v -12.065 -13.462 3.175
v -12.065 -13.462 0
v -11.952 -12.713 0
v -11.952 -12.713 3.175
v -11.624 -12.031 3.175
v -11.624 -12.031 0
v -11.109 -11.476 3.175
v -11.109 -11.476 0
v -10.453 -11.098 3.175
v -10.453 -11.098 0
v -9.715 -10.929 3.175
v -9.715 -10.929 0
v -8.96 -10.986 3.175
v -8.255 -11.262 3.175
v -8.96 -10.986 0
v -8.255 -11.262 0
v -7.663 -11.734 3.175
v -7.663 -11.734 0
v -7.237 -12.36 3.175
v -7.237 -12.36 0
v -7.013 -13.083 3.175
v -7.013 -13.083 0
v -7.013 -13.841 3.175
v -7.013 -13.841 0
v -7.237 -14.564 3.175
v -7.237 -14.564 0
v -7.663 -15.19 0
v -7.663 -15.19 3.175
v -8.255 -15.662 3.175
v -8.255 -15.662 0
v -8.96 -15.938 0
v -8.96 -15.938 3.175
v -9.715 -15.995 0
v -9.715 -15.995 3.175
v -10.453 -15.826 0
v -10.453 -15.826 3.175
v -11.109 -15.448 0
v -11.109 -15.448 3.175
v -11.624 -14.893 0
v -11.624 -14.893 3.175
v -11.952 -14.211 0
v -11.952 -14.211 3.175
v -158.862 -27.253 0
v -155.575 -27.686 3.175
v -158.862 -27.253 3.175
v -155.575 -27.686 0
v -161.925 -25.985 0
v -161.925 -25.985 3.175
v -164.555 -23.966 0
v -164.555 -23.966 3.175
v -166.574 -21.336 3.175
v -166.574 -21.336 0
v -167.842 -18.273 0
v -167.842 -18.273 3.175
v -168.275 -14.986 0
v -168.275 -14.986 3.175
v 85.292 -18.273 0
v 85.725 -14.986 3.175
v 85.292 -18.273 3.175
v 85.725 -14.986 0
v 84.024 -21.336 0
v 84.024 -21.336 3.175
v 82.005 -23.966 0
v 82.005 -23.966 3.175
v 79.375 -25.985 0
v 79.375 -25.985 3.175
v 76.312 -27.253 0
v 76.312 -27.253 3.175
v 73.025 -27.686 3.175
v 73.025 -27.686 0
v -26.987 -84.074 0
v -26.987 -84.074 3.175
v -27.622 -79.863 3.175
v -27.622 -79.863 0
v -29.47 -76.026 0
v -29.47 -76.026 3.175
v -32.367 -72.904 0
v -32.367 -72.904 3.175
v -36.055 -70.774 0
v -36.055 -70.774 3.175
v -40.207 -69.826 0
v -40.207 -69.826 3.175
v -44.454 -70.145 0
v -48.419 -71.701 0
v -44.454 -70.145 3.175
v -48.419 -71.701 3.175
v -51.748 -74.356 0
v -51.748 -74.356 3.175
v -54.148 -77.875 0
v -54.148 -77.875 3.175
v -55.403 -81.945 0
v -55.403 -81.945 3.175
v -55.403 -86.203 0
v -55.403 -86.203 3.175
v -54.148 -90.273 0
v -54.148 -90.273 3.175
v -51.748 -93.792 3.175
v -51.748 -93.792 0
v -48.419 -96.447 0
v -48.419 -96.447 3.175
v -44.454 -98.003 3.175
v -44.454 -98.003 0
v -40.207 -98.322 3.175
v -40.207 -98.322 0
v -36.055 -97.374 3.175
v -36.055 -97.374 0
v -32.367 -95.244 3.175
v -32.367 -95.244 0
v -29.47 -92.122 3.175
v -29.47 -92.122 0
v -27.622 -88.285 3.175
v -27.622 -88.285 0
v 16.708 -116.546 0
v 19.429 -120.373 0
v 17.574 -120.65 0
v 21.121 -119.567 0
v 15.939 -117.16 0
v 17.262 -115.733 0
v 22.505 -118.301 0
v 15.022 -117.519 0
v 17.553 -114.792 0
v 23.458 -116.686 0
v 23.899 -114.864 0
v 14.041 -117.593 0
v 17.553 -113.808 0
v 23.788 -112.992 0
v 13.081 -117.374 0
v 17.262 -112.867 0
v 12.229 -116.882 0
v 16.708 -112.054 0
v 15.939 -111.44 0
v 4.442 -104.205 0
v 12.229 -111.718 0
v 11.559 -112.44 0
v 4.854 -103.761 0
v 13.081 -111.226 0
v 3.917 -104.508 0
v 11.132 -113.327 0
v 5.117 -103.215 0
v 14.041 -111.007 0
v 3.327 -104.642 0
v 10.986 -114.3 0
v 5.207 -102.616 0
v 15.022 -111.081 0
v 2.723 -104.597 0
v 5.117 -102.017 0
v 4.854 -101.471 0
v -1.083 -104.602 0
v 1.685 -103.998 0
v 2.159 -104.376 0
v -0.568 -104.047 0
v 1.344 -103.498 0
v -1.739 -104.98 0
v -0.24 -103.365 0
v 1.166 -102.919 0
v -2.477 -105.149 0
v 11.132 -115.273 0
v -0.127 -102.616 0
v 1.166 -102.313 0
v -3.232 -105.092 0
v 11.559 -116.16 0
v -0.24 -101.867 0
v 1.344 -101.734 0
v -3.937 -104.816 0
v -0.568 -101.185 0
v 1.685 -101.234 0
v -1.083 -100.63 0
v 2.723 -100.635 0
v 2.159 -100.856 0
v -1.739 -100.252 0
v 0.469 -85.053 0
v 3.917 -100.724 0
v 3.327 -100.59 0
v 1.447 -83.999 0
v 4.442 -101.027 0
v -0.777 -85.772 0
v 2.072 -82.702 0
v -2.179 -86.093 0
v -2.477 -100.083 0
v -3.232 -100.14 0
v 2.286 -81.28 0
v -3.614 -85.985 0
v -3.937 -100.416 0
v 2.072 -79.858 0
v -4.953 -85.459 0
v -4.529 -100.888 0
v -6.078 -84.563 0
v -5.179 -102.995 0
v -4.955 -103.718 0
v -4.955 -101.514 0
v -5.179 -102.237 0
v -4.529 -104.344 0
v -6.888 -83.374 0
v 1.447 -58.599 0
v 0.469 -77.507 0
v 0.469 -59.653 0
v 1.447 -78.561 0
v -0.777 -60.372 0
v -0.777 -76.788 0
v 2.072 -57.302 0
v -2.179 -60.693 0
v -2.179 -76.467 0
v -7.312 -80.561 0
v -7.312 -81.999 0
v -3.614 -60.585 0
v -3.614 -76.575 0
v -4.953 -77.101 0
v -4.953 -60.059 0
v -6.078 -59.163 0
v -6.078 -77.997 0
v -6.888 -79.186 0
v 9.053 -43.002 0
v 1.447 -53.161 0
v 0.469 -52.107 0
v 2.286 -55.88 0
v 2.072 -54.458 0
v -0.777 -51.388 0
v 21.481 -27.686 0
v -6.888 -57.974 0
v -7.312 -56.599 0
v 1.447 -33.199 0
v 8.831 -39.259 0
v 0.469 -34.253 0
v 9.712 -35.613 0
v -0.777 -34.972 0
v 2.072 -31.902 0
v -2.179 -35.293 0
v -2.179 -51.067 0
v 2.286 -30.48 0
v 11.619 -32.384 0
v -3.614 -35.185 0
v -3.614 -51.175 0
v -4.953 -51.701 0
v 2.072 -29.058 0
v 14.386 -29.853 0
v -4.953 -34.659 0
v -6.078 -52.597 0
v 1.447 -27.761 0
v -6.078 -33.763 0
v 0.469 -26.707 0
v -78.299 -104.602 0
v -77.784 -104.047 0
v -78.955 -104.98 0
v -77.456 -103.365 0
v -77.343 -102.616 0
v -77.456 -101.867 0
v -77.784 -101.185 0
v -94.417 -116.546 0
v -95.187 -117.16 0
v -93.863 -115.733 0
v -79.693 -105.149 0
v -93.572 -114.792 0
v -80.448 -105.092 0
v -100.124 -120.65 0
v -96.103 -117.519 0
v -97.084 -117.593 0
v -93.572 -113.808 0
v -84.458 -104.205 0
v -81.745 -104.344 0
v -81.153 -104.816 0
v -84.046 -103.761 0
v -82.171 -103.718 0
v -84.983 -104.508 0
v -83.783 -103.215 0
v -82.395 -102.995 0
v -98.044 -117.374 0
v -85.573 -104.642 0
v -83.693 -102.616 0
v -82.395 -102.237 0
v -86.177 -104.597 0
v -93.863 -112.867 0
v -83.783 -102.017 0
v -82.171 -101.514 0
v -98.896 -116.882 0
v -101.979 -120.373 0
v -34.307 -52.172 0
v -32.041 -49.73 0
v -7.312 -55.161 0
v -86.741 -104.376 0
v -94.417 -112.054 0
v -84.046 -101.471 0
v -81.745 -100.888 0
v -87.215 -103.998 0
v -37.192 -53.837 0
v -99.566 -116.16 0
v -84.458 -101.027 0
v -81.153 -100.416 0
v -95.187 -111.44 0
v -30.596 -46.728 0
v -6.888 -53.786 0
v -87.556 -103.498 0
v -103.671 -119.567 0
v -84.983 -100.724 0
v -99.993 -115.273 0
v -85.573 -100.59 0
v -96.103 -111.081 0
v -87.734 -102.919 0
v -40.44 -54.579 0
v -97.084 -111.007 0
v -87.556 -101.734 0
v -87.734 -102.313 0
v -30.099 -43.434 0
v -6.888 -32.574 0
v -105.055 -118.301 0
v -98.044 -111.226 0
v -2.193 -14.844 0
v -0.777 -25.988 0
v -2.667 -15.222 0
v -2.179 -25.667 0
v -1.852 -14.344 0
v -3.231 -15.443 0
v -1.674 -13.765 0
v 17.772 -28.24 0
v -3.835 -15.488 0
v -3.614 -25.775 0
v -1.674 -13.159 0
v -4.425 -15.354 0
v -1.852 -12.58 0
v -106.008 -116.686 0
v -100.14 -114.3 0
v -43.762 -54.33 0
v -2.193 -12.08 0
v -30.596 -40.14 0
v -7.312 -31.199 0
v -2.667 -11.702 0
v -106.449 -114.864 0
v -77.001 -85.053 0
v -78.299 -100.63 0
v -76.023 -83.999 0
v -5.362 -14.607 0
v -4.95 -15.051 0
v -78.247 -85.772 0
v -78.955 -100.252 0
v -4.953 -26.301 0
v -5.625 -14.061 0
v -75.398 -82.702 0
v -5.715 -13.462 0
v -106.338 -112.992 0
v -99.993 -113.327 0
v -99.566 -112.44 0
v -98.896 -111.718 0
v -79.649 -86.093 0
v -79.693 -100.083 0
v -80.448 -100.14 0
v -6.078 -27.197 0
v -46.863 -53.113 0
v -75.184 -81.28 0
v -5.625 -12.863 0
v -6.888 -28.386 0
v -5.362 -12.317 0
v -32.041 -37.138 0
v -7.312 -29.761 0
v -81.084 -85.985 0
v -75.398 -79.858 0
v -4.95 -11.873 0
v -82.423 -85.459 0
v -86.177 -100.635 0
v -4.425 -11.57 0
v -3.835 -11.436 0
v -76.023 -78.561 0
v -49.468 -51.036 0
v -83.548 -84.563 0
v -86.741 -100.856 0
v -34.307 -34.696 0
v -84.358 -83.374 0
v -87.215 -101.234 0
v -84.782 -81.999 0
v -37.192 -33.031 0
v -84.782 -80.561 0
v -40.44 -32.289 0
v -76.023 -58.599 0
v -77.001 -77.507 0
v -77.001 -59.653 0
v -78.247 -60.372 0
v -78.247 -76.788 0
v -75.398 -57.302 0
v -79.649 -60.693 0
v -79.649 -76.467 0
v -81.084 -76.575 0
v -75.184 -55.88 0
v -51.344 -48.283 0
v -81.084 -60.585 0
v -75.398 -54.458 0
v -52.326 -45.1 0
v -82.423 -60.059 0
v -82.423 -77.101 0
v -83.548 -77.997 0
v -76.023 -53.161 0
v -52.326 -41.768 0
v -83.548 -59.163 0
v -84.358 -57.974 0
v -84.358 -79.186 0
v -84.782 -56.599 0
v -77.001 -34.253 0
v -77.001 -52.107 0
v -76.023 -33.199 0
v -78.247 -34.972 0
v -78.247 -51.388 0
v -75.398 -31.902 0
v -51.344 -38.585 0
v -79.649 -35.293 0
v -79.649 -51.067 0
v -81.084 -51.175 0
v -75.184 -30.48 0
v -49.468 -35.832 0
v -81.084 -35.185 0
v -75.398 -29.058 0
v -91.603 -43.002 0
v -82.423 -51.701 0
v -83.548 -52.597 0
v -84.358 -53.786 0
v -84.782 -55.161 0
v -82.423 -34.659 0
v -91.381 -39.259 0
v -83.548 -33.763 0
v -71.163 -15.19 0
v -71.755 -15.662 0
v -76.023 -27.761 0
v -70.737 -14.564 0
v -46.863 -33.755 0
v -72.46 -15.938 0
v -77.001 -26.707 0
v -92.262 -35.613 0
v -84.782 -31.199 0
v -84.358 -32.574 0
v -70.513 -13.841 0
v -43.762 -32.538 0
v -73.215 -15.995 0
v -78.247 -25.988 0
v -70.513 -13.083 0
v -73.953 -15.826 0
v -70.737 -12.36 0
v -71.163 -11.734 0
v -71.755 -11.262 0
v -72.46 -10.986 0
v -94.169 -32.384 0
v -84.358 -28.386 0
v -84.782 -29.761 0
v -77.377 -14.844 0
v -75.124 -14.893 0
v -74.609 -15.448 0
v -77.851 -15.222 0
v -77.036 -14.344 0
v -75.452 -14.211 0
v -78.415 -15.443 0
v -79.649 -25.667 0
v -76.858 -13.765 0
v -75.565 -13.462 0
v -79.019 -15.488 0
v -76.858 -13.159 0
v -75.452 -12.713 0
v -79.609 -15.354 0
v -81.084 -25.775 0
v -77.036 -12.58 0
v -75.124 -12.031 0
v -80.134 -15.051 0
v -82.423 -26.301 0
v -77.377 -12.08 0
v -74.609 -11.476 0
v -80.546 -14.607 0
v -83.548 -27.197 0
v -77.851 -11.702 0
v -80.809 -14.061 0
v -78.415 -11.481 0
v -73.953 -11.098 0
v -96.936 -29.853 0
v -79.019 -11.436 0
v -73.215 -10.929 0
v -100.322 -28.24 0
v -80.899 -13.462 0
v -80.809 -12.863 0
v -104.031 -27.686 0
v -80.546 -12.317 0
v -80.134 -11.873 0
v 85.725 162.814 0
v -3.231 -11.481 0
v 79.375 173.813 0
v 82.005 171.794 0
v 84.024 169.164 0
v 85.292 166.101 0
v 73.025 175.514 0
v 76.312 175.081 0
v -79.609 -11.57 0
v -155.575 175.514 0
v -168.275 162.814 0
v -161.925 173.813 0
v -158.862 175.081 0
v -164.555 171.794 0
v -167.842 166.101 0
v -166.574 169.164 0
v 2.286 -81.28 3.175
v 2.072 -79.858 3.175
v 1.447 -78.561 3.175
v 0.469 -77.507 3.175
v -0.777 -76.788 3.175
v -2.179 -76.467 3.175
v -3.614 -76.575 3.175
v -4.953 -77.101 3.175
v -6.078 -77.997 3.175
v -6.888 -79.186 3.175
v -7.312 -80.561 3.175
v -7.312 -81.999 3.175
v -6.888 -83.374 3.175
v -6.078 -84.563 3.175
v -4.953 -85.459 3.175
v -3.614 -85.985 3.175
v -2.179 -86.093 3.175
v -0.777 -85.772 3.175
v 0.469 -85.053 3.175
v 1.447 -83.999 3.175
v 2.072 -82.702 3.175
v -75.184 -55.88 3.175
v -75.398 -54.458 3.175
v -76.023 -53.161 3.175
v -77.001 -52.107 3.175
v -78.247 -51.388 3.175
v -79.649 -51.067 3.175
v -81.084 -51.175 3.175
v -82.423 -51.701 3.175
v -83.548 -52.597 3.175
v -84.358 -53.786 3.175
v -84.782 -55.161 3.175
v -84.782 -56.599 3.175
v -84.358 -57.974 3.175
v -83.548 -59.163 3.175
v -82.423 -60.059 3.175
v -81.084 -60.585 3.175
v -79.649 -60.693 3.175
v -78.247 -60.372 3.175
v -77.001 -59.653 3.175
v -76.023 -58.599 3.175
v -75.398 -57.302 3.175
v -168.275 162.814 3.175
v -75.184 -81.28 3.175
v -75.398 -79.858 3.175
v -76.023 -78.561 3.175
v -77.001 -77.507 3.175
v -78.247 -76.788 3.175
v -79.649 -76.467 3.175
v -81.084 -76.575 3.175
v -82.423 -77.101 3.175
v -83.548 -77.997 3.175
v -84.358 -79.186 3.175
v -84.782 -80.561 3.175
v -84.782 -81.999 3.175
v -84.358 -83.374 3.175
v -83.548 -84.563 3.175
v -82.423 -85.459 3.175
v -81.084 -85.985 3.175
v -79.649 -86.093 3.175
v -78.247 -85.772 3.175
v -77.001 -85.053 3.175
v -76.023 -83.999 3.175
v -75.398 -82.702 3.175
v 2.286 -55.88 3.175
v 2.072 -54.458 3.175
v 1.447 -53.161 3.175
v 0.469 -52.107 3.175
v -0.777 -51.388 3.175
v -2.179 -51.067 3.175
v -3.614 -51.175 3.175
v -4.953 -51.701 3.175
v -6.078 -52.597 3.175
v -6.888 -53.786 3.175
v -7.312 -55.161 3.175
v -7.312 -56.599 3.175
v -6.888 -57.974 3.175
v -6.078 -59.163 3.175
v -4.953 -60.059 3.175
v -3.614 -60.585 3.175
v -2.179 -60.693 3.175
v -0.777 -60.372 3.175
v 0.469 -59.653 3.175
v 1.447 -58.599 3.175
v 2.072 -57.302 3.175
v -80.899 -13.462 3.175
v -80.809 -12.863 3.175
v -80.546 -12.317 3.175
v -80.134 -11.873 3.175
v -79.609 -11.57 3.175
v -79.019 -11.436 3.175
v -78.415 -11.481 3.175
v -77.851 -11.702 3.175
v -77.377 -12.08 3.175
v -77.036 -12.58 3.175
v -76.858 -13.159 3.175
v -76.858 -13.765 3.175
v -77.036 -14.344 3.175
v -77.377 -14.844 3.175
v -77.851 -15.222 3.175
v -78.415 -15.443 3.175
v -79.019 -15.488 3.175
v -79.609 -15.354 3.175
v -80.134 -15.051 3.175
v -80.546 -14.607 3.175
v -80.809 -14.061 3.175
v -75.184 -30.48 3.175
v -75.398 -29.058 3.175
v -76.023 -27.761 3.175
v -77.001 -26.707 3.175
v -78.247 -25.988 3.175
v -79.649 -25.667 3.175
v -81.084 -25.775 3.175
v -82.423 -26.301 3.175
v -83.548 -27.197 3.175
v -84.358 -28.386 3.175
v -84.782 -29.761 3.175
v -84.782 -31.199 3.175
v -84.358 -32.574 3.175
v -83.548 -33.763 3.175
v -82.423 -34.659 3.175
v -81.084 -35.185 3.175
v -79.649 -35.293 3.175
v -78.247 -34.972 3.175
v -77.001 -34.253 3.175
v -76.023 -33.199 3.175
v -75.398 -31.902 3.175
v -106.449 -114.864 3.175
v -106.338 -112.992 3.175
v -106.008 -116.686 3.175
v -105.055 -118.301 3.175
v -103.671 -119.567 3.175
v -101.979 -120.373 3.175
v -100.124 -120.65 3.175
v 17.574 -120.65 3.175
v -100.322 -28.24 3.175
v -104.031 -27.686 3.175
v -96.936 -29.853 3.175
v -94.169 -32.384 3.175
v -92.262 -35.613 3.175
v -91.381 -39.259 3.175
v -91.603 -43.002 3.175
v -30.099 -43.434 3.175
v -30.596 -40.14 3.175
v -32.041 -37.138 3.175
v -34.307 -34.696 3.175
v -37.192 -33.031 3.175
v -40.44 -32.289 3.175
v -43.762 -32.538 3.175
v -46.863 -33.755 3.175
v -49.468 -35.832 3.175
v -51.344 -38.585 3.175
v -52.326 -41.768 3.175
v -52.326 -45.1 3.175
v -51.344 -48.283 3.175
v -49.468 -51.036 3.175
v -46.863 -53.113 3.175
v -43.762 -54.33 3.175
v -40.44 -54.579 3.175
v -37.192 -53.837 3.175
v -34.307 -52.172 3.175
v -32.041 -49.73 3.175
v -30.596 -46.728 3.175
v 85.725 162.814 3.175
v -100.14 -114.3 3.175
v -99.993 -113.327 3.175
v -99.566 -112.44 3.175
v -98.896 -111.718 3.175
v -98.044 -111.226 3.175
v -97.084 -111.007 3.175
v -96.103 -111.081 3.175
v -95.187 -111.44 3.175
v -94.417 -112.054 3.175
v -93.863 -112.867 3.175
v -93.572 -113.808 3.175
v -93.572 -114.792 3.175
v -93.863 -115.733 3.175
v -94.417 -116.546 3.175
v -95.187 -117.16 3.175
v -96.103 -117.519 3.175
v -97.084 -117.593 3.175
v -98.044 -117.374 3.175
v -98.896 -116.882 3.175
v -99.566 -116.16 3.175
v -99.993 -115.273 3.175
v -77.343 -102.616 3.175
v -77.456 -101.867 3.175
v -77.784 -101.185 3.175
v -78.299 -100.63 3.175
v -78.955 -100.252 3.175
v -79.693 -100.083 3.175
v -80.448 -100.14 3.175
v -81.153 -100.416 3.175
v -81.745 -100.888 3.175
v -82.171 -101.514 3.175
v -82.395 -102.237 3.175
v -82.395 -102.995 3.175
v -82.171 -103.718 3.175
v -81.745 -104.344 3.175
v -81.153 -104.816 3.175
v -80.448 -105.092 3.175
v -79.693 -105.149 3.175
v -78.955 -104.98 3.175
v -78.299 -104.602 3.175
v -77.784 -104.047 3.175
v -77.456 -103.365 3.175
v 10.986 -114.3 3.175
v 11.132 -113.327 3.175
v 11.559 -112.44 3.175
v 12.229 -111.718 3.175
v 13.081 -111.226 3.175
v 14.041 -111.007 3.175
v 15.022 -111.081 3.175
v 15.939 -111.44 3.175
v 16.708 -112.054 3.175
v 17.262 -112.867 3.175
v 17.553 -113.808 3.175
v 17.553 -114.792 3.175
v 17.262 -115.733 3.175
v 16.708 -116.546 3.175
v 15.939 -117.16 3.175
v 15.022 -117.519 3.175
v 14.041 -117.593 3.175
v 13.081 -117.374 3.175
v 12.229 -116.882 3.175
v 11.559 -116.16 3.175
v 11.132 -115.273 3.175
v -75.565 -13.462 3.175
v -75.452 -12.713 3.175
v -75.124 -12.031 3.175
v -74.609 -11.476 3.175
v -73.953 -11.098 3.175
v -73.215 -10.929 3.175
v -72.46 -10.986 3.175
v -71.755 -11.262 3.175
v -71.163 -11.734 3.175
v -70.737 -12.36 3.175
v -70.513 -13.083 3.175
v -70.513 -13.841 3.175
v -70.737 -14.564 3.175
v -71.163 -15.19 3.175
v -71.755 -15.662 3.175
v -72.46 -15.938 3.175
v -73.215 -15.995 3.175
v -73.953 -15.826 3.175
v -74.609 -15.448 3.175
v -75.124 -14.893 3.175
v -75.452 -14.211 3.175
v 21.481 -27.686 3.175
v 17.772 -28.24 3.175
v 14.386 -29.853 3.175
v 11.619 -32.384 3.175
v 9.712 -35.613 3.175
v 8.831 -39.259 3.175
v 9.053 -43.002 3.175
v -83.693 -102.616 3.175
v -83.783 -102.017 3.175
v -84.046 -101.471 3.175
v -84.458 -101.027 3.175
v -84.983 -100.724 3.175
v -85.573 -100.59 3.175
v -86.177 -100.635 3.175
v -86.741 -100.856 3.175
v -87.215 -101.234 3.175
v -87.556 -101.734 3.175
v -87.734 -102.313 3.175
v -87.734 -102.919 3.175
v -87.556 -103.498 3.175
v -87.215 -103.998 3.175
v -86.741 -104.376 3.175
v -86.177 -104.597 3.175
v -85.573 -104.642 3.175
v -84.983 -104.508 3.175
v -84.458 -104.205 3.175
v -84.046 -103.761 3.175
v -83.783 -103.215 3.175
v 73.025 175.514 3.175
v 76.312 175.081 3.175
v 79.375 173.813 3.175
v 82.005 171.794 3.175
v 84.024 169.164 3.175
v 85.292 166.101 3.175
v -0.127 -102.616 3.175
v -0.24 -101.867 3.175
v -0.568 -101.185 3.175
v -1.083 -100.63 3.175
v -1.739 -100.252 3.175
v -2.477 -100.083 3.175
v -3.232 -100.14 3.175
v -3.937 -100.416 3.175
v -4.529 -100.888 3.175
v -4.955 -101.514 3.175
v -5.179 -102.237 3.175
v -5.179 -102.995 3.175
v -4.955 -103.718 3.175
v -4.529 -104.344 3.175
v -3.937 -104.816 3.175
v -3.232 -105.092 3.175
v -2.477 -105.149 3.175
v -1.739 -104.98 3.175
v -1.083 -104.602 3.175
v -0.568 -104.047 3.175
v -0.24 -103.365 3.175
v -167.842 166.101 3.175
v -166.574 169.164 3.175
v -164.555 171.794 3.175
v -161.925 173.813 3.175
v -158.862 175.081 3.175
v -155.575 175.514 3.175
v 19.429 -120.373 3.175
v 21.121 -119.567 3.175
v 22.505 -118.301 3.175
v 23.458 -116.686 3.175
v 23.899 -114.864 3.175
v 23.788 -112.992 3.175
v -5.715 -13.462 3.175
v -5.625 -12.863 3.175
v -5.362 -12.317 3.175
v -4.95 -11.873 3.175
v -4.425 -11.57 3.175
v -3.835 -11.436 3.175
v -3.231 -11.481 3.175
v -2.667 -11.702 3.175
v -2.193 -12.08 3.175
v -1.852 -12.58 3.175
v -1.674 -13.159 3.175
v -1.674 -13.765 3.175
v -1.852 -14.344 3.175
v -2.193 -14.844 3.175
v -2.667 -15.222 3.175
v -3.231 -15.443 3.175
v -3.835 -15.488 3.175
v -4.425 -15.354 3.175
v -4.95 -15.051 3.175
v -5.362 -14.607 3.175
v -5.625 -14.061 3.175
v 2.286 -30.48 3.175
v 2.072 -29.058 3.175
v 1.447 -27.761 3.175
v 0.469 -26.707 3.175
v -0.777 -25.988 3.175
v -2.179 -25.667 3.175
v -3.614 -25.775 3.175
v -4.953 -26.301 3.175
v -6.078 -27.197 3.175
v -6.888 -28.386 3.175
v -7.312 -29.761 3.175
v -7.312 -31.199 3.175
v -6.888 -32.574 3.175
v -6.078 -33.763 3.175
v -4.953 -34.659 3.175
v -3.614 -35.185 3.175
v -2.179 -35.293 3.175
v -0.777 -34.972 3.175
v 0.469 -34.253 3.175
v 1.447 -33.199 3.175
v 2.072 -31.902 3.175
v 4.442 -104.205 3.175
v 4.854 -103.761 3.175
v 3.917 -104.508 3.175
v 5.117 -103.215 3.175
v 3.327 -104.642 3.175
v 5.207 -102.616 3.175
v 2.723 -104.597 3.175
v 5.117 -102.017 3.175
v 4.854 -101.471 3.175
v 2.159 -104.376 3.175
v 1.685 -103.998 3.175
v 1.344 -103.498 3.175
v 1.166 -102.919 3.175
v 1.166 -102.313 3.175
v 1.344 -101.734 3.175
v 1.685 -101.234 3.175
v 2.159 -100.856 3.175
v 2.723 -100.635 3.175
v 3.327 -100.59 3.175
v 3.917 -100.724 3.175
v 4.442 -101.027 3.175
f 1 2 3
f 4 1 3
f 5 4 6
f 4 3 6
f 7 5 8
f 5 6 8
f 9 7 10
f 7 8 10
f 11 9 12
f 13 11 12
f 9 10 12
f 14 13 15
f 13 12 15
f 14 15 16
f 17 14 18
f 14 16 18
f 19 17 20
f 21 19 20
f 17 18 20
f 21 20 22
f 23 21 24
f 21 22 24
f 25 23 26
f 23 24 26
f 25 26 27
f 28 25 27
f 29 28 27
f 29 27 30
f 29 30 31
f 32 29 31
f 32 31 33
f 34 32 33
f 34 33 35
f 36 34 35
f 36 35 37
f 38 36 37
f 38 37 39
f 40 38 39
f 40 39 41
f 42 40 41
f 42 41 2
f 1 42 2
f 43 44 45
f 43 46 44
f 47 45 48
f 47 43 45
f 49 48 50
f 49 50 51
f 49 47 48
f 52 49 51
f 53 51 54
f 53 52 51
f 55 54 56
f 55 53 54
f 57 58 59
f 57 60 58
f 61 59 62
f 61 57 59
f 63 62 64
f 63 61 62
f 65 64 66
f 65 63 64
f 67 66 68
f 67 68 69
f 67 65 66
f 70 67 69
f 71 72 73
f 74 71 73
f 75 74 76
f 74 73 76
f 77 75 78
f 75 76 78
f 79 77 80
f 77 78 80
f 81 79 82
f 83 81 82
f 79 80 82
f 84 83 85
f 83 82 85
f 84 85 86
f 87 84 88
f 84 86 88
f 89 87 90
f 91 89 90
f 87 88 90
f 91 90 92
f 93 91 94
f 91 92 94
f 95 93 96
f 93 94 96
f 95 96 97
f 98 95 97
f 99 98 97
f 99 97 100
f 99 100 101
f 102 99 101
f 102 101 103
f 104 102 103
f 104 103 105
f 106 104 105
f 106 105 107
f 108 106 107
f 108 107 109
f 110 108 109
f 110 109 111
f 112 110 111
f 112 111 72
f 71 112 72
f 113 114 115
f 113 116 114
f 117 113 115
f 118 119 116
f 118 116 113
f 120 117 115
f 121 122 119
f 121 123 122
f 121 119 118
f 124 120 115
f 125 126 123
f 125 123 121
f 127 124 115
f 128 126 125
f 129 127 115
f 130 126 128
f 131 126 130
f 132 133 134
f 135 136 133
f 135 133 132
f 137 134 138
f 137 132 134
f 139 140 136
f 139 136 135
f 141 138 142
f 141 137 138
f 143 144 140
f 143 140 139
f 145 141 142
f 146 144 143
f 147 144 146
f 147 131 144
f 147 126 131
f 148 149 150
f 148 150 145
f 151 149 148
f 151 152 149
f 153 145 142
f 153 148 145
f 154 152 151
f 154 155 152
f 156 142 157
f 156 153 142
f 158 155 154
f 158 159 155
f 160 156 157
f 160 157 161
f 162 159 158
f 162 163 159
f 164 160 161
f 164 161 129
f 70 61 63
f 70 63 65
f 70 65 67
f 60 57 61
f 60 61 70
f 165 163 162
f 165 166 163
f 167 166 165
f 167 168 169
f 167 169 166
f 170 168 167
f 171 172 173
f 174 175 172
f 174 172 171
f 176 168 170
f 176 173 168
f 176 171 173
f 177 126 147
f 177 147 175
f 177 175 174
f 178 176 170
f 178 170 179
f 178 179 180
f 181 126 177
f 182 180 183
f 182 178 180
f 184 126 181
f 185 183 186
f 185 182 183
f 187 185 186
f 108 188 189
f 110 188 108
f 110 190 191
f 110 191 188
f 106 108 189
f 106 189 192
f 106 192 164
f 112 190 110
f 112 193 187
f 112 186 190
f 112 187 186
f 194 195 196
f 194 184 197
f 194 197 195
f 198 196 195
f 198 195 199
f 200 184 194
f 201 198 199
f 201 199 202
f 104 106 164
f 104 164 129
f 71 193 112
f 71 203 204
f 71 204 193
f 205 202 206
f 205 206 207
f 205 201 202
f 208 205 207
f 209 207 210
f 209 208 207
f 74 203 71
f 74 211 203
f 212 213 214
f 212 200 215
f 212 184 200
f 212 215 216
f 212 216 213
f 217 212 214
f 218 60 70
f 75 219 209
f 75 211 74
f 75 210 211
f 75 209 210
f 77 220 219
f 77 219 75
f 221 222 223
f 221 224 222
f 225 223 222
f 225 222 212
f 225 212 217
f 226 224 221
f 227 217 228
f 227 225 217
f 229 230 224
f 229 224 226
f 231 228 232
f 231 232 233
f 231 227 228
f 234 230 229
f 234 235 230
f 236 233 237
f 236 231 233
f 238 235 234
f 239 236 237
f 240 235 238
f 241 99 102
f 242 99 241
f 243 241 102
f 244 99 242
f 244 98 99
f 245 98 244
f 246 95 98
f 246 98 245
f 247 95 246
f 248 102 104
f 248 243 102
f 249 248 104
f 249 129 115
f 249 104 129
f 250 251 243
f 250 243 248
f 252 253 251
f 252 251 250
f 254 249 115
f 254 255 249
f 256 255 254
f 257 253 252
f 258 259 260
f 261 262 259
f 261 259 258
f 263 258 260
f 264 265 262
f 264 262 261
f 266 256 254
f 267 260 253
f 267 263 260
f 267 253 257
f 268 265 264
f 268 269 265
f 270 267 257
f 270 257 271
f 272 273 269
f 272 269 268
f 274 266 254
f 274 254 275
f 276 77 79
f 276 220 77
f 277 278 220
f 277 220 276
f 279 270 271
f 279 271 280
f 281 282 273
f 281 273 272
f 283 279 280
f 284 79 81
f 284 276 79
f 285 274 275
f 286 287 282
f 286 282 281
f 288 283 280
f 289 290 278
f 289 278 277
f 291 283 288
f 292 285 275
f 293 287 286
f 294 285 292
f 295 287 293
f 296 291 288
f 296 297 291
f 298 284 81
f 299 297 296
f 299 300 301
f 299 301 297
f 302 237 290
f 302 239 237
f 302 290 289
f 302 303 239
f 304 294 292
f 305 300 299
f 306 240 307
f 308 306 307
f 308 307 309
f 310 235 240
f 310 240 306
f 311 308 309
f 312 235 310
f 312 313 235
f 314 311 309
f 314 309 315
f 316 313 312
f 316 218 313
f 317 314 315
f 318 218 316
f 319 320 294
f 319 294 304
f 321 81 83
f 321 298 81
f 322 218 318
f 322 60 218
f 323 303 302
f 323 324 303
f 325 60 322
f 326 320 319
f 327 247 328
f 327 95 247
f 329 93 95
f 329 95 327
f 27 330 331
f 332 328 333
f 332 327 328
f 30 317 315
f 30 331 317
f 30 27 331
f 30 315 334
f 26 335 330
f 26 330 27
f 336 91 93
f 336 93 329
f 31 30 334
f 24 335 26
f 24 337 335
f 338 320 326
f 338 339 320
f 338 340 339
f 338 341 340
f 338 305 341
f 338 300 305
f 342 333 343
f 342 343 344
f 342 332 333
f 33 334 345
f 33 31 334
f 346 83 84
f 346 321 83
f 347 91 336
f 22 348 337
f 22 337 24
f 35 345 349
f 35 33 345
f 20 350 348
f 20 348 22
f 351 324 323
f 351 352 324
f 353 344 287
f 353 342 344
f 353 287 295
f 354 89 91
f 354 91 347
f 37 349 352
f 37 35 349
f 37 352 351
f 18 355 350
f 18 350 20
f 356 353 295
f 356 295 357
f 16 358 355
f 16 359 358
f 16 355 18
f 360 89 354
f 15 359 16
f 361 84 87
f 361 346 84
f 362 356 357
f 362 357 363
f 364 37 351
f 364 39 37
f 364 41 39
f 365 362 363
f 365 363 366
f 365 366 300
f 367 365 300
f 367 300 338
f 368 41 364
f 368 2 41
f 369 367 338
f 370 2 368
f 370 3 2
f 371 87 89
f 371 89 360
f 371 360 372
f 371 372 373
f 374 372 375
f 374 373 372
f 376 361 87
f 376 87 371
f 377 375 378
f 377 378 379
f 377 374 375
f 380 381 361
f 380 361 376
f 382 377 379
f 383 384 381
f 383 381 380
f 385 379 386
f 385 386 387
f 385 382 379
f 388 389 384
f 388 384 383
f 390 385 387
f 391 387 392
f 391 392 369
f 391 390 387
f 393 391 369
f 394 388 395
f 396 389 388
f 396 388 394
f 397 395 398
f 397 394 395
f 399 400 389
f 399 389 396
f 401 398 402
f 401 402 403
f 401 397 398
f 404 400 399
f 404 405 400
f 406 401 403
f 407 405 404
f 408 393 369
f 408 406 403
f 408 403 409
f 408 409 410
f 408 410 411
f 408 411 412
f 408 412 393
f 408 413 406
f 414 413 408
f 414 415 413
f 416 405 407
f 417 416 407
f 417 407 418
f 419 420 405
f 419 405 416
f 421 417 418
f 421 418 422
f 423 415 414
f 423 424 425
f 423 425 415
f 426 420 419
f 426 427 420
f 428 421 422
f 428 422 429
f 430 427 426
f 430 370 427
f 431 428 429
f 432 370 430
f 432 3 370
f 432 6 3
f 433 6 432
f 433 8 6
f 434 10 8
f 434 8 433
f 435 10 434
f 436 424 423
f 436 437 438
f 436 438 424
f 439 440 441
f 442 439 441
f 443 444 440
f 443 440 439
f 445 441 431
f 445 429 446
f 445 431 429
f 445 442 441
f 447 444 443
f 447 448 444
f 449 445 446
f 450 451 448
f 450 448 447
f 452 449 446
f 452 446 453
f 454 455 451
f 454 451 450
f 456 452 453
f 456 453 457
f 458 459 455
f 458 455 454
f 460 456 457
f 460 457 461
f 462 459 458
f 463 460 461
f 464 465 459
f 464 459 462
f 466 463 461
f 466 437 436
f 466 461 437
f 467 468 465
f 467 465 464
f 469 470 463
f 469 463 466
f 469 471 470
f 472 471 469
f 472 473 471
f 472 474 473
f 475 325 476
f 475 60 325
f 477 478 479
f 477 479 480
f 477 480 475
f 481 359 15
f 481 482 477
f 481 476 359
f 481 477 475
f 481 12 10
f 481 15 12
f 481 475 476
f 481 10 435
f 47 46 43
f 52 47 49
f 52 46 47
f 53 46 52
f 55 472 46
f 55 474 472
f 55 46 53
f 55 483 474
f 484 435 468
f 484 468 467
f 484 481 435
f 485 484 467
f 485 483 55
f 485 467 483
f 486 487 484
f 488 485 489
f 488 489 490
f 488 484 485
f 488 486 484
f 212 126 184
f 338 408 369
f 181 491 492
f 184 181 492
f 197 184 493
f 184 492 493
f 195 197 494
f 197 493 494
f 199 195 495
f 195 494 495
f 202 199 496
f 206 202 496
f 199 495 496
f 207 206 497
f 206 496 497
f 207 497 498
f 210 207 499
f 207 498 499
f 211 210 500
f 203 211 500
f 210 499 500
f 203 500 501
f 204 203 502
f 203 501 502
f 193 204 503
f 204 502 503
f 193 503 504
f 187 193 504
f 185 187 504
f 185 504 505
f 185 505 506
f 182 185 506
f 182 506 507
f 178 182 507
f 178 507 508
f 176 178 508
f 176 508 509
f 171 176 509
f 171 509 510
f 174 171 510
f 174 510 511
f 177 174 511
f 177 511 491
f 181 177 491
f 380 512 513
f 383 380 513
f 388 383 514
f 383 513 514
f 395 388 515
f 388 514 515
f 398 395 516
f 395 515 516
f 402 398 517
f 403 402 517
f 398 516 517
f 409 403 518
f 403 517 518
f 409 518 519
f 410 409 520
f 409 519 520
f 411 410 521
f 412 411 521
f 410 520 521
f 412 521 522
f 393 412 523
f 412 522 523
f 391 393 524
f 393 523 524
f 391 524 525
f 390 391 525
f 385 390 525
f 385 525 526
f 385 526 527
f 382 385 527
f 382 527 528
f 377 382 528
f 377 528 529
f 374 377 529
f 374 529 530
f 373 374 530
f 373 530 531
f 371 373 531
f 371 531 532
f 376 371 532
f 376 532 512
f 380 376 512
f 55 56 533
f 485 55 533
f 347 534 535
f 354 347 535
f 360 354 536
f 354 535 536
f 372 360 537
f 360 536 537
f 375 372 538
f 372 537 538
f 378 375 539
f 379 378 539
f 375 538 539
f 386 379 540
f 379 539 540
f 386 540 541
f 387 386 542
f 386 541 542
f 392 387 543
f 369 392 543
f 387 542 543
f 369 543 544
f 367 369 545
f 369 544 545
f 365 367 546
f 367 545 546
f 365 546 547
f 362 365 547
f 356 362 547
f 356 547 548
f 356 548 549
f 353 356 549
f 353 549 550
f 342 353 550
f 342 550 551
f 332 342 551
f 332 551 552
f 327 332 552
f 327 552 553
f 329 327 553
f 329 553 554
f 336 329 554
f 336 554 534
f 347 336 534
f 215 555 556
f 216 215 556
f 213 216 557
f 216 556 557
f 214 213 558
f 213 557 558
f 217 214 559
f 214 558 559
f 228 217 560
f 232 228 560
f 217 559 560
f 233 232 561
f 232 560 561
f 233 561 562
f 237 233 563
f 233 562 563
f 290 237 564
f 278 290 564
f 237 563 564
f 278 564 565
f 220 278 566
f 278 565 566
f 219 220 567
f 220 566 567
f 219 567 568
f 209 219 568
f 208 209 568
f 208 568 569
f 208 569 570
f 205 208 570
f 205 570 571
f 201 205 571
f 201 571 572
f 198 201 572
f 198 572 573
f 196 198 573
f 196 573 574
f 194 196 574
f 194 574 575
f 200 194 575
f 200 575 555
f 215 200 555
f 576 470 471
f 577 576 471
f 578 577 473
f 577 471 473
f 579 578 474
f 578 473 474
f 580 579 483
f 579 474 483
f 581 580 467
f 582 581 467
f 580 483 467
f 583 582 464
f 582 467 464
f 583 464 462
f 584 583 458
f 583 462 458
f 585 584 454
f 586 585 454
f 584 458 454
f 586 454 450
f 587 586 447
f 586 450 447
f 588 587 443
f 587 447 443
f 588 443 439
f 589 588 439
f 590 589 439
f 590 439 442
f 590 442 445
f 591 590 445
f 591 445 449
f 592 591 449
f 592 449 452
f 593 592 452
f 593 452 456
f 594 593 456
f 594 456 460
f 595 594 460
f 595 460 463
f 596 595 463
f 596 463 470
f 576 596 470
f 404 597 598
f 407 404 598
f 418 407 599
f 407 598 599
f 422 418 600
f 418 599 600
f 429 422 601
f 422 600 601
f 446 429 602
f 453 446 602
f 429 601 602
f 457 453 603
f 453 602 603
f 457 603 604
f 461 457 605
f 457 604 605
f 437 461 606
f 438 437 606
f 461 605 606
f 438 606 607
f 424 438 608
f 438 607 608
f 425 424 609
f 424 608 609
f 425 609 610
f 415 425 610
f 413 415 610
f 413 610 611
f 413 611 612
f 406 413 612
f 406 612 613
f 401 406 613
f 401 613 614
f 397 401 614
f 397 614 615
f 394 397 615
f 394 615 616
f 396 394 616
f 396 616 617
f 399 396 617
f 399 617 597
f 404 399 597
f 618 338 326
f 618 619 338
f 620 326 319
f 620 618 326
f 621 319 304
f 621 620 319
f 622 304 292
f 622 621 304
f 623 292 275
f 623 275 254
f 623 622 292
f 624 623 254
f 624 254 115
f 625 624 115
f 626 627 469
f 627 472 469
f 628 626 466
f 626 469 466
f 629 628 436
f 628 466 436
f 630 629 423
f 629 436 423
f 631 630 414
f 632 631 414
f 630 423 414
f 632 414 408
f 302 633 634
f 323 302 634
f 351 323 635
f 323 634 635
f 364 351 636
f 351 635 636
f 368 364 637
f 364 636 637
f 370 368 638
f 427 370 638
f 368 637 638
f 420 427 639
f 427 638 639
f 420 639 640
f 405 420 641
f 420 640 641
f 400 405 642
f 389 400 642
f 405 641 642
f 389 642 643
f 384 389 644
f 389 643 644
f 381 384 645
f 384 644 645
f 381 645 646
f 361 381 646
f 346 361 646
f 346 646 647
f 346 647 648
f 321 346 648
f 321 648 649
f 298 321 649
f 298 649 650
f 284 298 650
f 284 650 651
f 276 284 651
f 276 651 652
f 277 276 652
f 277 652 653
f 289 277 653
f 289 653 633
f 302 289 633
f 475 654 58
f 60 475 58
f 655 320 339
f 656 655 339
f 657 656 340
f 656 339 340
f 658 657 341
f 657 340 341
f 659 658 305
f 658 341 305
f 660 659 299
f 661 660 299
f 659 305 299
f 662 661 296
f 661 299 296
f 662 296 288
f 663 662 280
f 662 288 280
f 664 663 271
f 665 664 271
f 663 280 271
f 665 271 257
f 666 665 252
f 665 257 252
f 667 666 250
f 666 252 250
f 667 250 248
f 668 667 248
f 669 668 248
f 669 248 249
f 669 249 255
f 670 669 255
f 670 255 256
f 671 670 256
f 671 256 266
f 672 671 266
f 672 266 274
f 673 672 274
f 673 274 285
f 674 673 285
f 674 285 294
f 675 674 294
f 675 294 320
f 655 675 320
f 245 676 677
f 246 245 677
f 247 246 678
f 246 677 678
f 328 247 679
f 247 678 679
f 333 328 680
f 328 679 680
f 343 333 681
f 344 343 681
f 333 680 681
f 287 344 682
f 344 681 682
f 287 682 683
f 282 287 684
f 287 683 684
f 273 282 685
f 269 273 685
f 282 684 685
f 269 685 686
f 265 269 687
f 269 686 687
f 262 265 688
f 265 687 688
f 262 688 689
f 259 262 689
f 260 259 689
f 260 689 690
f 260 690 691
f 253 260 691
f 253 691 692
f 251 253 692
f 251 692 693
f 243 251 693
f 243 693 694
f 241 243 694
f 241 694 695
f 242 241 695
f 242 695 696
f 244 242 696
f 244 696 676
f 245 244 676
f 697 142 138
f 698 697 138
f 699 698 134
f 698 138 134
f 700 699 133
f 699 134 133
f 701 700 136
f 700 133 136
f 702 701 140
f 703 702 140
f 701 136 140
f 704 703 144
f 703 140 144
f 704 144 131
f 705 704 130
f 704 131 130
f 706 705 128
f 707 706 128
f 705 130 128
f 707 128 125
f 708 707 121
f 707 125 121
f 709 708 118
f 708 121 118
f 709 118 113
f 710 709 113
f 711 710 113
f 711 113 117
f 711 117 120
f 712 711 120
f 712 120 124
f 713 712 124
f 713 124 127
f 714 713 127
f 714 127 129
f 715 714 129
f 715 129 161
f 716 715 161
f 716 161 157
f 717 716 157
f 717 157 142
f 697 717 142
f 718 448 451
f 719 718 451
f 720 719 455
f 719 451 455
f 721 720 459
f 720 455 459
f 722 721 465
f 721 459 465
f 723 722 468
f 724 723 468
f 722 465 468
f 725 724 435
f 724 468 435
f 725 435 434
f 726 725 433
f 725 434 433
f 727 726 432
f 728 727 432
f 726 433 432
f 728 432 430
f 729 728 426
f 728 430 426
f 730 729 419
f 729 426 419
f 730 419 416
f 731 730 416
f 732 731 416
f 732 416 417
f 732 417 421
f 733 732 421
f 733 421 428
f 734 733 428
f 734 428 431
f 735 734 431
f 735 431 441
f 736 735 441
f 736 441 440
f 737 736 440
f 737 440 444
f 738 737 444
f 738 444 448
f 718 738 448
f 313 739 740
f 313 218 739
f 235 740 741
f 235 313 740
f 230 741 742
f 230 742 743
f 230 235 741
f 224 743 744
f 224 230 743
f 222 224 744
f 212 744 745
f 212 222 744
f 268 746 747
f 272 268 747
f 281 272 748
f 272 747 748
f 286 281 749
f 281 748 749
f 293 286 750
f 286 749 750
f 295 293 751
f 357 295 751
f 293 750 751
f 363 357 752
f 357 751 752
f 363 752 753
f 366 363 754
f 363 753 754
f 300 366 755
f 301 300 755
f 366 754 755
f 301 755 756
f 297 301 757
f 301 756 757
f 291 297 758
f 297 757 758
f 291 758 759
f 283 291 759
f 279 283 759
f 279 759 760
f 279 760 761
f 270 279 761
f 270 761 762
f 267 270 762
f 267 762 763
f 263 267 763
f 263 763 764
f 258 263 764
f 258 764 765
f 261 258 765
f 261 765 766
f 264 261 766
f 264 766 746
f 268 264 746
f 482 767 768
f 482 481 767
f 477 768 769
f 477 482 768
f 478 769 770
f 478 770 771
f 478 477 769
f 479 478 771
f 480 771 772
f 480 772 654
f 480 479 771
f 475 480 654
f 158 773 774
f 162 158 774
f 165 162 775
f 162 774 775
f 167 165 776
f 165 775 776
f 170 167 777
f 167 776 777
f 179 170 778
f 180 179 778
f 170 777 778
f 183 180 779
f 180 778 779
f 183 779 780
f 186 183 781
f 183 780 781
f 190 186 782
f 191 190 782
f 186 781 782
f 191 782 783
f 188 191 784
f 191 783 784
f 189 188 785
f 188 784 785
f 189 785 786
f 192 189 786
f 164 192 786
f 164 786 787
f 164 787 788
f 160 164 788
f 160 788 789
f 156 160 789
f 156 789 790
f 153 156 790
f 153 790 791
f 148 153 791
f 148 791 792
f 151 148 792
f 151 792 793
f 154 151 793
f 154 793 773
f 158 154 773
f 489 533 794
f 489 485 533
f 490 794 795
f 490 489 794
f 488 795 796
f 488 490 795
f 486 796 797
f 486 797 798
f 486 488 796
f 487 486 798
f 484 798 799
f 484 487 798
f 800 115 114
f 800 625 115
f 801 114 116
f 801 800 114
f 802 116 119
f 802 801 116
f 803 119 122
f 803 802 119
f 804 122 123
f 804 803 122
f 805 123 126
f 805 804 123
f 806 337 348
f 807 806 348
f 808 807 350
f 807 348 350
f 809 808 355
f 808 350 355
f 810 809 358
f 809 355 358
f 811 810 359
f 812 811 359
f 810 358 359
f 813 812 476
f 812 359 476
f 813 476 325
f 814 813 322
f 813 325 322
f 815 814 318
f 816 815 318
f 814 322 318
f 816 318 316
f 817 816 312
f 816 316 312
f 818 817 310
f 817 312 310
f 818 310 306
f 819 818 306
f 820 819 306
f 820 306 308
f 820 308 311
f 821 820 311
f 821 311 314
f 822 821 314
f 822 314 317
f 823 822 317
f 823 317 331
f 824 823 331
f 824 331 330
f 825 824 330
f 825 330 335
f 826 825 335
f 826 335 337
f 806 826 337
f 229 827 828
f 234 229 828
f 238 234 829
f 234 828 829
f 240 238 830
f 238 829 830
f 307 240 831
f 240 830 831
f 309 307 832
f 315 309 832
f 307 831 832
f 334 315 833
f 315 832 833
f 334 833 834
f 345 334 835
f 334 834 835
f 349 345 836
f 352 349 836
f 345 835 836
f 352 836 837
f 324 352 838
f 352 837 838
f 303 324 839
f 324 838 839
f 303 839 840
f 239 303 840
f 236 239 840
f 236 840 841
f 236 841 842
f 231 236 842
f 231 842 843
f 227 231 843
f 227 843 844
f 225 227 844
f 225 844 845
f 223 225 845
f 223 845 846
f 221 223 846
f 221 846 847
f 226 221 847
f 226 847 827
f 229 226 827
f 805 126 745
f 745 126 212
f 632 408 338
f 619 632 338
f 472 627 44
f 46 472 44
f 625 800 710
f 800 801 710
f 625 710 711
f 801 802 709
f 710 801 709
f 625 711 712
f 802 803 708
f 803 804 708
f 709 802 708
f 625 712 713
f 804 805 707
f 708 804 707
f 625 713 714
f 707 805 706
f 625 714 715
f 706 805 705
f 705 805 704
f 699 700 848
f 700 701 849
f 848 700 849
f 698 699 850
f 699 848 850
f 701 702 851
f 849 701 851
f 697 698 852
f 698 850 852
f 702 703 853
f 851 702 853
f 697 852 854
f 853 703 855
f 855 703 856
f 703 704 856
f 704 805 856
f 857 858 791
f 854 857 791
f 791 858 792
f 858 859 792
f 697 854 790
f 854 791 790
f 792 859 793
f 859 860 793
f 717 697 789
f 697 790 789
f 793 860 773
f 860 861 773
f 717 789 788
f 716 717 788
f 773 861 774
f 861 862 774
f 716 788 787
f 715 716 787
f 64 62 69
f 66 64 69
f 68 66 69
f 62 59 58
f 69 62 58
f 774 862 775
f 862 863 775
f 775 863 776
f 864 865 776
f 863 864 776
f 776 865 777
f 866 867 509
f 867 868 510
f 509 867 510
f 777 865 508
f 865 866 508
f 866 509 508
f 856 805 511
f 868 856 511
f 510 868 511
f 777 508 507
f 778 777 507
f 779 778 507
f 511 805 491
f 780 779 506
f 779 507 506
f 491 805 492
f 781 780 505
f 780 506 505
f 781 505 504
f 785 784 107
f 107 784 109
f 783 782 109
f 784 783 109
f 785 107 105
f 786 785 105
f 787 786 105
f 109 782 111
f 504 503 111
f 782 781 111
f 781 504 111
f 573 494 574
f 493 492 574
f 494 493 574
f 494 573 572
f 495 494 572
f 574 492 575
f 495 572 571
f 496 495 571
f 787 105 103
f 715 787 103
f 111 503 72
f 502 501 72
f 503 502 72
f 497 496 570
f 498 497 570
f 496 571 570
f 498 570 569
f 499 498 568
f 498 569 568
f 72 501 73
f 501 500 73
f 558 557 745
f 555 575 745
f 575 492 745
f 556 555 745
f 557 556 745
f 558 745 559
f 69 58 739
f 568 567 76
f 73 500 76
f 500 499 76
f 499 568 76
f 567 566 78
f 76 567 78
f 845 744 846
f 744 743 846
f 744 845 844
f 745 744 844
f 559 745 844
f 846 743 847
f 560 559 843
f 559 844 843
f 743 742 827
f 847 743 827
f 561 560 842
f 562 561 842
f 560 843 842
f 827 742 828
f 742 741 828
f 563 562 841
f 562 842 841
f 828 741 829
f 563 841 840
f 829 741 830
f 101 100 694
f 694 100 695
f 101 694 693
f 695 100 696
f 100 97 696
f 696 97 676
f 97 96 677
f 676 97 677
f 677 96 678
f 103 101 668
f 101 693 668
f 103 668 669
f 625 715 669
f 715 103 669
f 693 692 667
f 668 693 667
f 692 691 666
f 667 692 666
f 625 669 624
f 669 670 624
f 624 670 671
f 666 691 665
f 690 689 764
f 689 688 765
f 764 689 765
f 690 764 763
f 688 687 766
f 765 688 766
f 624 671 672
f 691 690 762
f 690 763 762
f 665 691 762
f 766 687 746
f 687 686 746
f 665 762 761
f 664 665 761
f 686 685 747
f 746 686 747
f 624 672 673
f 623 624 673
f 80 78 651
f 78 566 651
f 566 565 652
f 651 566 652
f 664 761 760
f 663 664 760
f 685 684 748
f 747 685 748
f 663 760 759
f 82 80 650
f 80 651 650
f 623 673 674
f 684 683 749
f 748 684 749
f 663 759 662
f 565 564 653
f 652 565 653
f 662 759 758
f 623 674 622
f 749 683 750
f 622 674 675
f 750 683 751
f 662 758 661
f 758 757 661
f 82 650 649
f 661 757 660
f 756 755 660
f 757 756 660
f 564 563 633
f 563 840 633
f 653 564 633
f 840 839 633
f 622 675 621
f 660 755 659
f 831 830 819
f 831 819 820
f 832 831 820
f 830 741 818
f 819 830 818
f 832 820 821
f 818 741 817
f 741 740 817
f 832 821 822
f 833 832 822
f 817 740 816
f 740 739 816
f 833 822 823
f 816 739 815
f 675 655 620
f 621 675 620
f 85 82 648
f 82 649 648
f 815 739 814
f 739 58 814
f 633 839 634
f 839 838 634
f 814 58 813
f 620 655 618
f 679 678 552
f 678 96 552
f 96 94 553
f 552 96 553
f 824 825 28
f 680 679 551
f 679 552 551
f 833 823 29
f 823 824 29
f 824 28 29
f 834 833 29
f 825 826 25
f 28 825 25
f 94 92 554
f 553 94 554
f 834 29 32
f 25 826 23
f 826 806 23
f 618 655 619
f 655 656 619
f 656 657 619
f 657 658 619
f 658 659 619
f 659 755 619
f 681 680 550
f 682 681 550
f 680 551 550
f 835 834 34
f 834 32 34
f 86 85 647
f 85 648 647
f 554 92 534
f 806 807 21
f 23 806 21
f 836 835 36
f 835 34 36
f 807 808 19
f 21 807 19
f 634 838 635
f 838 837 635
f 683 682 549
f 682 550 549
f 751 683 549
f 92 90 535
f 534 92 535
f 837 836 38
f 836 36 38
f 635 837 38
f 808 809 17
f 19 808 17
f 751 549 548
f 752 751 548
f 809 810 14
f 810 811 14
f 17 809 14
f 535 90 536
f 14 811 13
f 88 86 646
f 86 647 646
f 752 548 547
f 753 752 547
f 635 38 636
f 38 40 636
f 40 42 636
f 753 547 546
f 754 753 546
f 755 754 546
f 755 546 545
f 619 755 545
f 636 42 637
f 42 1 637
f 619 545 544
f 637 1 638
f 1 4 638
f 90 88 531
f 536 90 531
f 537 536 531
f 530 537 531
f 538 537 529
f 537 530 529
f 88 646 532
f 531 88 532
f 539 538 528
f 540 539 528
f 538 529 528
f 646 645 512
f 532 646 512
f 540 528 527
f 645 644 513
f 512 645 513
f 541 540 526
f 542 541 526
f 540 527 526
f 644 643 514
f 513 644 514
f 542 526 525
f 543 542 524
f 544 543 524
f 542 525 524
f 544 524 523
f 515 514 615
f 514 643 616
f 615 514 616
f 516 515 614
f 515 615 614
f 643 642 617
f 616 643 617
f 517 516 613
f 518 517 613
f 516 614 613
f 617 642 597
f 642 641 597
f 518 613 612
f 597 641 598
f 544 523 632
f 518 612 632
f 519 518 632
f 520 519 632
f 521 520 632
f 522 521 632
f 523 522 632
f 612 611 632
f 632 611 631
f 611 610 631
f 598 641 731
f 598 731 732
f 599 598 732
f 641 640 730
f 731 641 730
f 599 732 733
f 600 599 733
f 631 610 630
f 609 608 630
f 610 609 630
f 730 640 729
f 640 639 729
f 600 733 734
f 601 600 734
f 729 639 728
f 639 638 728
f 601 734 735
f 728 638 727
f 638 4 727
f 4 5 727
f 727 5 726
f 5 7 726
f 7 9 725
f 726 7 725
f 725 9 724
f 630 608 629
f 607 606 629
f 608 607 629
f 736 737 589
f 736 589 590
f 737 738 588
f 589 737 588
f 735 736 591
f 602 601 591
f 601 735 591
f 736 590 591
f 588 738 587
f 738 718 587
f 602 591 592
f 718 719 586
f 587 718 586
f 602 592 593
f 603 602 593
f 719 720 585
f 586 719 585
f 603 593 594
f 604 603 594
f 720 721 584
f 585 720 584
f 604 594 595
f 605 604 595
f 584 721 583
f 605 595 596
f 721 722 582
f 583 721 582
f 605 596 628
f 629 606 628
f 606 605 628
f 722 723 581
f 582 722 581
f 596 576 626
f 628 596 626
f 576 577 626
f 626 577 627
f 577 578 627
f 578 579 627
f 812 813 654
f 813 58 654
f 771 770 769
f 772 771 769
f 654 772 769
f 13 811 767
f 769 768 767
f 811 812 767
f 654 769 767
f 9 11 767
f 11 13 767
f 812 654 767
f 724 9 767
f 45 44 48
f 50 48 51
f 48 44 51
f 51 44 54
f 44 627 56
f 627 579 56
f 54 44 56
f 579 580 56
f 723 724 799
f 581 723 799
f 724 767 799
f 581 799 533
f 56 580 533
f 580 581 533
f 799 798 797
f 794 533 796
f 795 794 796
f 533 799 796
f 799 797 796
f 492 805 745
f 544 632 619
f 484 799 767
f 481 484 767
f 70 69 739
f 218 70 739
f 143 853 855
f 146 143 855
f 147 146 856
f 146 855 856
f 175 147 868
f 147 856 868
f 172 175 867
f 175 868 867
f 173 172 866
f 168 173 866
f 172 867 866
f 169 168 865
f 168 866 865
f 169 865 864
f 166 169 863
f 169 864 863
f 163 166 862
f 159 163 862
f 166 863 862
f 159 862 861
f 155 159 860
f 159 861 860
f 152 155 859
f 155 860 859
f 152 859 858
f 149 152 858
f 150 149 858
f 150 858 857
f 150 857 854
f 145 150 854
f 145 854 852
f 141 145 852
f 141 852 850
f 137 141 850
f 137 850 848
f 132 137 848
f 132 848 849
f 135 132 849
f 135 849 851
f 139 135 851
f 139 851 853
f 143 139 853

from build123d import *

# Parameters (mm, degrees)
BOSS_EXTRUDE1_DEPTH = 3.175
FILLET1_R           = 6.35
SKETCH2_R           = 3.302
CUT_EXTRUDE1_DEPTH  = 161.944735796
SKETCH3_R           = 2.54
SKETCH3_R_2         = 2.032
CUT_EXTRUDE2_DEPTH  = 161.944735796
SKETCH4_R           = 14.2875
SKETCH4_R_2         = 11.176
SKETCH4_R_3         = 2.54
SKETCH4_R_4         = 2.032
CUT_EXTRUDE3_DEPTH  = 161.944735796
SKETCH5_R           = 4.826
CUT_EXTRUDE4_DEPTH  = 161.944735796
BOSS_EXTRUDE2_DEPTH = 3.175
FILLET2_R           = 12.7
FILLET3_R           = 12.7


with BuildPart() as part:
    # Sketch1 → Boss-Extrude1 (new body)
    with BuildSketch(Plane.XY):
        Polygon((0, 0), (-82.55, 0), (-107.95, -120.65), (25.4, -120.65), align=None)
    extrude(amount=BOSS_EXTRUDE1_DEPTH)

    # Fillet1
    fillet1_edges = [part.edges().sort_by_distance(p)[0] for p in [
        (25.4, -120.65, 1.5875),
        (-107.95, -120.65, 1.5875),
        (-82.55, 0, 1.5875),
        (0, 0, 1.5875),
    ]]
    fillet(fillet1_edges, radius=FILLET1_R)

    # Sketch2 → Cut-Extrude1 (cut, through all)
    with BuildSketch(Plane(origin=(0, 0, 0), x_dir=(-1, 0, 0), z_dir=(0, 0, -1))):
        with Locations((-14.2875, -114.3)):
            Circle(SKETCH2_R)
        with Locations((96.8375, -114.3)):
            Circle(SKETCH2_R)
    extrude(amount=-CUT_EXTRUDE1_DEPTH, mode=Mode.SUBTRACT)

    # Sketch3 → Cut-Extrude2 (cut, through all)
    with BuildSketch(Plane(origin=(0, 0, 0), x_dir=(-1, 0, 0), z_dir=(0, 0, -1))):
        with Locations((9.525, -13.462)):
            Circle(SKETCH3_R)
        with Locations((73.025, -13.462)):
            Circle(SKETCH3_R)
        with Locations((3.683, -13.462)):
            Circle(SKETCH3_R_2)
        with Locations((78.867, -13.462)):
            Circle(SKETCH3_R_2)
    extrude(amount=-CUT_EXTRUDE2_DEPTH, mode=Mode.SUBTRACT)

    # Sketch4 → Cut-Extrude3 (cut, through all)
    with BuildSketch(Plane.XY.offset(3.175)):
        with Locations((-41.275, -84.074)):
            Circle(SKETCH4_R)
        with Locations((-41.275, -43.434)):
            Circle(SKETCH4_R_2)
        with Locations((-2.667, -102.616)):
            Circle(SKETCH4_R_3)
        with Locations((-79.883, -102.616)):
            Circle(SKETCH4_R_3)
        with Locations((-85.725, -102.616)):
            Circle(SKETCH4_R_4)
        with Locations((3.175, -102.616)):
            Circle(SKETCH4_R_4)
    extrude(amount=-CUT_EXTRUDE3_DEPTH, mode=Mode.SUBTRACT)

    # Sketch5 → Cut-Extrude4 (cut, through all)
    with BuildSketch(Plane.XY.offset(3.175)):
        with Locations((-80.01, -30.48)):
            Circle(SKETCH5_R)
        with Locations((-80.01, -55.88)):
            Circle(SKETCH5_R)
        with Locations((-80.01, -81.28)):
            Circle(SKETCH5_R)
        with Locations((-2.54, -81.28)):
            Circle(SKETCH5_R)
        with Locations((-2.54, -55.88)):
            Circle(SKETCH5_R)
        with Locations((-2.54, -30.48)):
            Circle(SKETCH5_R)
    extrude(amount=-CUT_EXTRUDE4_DEPTH, mode=Mode.SUBTRACT)

    # Sketch6 → Boss-Extrude2 (add)
    with BuildSketch(Plane.XY.offset(3.175)):
        with BuildLine():
            Line((-88.378631579, -27.686), (-168.275, -27.686))
            Line((-168.275, -27.686), (-168.275, 175.514))
            Line((-168.275, 175.514), (85.725, 175.514))
            Line((85.725, 175.514), (85.725, -27.686))
            Line((85.725, -27.686), (5.828631579, -27.686))
            Line((5.828631579, -27.686), (1.06143862, -5.041833445))
            ThreePointArc((1.06143862, -5.041833445), (-1.151374985, -1.419008334), (-5.152352515, 0))
            Line((-5.152352515, 0), (-77.397647485, 0))
            ThreePointArc((-77.397647485, 0), (-81.398625015, -1.419008334), (-83.61143862, -5.041833445))
            Line((-83.61143862, -5.041833445), (-88.378631579, -27.686))
        make_face()
    extrude(amount=-BOSS_EXTRUDE2_DEPTH)

    # Fillet2
    fillet2_edges = [part.edges().sort_by_distance(p)[0] for p in [
        (-88.378631579, -27.686, 1.5875),
        (5.828631579, -27.686, 1.5875),
    ]]
    fillet(fillet2_edges, radius=FILLET2_R)

    # Fillet3
    fillet3_edges = [part.edges().sort_by_distance(p)[0] for p in [
        (-168.275, -27.686, 1.5875),
        (-168.275, 175.514, 1.5875),
        (85.725, 175.514, 1.5875),
        (85.725, -27.686, 1.5875),
    ]]
    fillet(fillet3_edges, radius=FILLET3_R)


solid = part.part
